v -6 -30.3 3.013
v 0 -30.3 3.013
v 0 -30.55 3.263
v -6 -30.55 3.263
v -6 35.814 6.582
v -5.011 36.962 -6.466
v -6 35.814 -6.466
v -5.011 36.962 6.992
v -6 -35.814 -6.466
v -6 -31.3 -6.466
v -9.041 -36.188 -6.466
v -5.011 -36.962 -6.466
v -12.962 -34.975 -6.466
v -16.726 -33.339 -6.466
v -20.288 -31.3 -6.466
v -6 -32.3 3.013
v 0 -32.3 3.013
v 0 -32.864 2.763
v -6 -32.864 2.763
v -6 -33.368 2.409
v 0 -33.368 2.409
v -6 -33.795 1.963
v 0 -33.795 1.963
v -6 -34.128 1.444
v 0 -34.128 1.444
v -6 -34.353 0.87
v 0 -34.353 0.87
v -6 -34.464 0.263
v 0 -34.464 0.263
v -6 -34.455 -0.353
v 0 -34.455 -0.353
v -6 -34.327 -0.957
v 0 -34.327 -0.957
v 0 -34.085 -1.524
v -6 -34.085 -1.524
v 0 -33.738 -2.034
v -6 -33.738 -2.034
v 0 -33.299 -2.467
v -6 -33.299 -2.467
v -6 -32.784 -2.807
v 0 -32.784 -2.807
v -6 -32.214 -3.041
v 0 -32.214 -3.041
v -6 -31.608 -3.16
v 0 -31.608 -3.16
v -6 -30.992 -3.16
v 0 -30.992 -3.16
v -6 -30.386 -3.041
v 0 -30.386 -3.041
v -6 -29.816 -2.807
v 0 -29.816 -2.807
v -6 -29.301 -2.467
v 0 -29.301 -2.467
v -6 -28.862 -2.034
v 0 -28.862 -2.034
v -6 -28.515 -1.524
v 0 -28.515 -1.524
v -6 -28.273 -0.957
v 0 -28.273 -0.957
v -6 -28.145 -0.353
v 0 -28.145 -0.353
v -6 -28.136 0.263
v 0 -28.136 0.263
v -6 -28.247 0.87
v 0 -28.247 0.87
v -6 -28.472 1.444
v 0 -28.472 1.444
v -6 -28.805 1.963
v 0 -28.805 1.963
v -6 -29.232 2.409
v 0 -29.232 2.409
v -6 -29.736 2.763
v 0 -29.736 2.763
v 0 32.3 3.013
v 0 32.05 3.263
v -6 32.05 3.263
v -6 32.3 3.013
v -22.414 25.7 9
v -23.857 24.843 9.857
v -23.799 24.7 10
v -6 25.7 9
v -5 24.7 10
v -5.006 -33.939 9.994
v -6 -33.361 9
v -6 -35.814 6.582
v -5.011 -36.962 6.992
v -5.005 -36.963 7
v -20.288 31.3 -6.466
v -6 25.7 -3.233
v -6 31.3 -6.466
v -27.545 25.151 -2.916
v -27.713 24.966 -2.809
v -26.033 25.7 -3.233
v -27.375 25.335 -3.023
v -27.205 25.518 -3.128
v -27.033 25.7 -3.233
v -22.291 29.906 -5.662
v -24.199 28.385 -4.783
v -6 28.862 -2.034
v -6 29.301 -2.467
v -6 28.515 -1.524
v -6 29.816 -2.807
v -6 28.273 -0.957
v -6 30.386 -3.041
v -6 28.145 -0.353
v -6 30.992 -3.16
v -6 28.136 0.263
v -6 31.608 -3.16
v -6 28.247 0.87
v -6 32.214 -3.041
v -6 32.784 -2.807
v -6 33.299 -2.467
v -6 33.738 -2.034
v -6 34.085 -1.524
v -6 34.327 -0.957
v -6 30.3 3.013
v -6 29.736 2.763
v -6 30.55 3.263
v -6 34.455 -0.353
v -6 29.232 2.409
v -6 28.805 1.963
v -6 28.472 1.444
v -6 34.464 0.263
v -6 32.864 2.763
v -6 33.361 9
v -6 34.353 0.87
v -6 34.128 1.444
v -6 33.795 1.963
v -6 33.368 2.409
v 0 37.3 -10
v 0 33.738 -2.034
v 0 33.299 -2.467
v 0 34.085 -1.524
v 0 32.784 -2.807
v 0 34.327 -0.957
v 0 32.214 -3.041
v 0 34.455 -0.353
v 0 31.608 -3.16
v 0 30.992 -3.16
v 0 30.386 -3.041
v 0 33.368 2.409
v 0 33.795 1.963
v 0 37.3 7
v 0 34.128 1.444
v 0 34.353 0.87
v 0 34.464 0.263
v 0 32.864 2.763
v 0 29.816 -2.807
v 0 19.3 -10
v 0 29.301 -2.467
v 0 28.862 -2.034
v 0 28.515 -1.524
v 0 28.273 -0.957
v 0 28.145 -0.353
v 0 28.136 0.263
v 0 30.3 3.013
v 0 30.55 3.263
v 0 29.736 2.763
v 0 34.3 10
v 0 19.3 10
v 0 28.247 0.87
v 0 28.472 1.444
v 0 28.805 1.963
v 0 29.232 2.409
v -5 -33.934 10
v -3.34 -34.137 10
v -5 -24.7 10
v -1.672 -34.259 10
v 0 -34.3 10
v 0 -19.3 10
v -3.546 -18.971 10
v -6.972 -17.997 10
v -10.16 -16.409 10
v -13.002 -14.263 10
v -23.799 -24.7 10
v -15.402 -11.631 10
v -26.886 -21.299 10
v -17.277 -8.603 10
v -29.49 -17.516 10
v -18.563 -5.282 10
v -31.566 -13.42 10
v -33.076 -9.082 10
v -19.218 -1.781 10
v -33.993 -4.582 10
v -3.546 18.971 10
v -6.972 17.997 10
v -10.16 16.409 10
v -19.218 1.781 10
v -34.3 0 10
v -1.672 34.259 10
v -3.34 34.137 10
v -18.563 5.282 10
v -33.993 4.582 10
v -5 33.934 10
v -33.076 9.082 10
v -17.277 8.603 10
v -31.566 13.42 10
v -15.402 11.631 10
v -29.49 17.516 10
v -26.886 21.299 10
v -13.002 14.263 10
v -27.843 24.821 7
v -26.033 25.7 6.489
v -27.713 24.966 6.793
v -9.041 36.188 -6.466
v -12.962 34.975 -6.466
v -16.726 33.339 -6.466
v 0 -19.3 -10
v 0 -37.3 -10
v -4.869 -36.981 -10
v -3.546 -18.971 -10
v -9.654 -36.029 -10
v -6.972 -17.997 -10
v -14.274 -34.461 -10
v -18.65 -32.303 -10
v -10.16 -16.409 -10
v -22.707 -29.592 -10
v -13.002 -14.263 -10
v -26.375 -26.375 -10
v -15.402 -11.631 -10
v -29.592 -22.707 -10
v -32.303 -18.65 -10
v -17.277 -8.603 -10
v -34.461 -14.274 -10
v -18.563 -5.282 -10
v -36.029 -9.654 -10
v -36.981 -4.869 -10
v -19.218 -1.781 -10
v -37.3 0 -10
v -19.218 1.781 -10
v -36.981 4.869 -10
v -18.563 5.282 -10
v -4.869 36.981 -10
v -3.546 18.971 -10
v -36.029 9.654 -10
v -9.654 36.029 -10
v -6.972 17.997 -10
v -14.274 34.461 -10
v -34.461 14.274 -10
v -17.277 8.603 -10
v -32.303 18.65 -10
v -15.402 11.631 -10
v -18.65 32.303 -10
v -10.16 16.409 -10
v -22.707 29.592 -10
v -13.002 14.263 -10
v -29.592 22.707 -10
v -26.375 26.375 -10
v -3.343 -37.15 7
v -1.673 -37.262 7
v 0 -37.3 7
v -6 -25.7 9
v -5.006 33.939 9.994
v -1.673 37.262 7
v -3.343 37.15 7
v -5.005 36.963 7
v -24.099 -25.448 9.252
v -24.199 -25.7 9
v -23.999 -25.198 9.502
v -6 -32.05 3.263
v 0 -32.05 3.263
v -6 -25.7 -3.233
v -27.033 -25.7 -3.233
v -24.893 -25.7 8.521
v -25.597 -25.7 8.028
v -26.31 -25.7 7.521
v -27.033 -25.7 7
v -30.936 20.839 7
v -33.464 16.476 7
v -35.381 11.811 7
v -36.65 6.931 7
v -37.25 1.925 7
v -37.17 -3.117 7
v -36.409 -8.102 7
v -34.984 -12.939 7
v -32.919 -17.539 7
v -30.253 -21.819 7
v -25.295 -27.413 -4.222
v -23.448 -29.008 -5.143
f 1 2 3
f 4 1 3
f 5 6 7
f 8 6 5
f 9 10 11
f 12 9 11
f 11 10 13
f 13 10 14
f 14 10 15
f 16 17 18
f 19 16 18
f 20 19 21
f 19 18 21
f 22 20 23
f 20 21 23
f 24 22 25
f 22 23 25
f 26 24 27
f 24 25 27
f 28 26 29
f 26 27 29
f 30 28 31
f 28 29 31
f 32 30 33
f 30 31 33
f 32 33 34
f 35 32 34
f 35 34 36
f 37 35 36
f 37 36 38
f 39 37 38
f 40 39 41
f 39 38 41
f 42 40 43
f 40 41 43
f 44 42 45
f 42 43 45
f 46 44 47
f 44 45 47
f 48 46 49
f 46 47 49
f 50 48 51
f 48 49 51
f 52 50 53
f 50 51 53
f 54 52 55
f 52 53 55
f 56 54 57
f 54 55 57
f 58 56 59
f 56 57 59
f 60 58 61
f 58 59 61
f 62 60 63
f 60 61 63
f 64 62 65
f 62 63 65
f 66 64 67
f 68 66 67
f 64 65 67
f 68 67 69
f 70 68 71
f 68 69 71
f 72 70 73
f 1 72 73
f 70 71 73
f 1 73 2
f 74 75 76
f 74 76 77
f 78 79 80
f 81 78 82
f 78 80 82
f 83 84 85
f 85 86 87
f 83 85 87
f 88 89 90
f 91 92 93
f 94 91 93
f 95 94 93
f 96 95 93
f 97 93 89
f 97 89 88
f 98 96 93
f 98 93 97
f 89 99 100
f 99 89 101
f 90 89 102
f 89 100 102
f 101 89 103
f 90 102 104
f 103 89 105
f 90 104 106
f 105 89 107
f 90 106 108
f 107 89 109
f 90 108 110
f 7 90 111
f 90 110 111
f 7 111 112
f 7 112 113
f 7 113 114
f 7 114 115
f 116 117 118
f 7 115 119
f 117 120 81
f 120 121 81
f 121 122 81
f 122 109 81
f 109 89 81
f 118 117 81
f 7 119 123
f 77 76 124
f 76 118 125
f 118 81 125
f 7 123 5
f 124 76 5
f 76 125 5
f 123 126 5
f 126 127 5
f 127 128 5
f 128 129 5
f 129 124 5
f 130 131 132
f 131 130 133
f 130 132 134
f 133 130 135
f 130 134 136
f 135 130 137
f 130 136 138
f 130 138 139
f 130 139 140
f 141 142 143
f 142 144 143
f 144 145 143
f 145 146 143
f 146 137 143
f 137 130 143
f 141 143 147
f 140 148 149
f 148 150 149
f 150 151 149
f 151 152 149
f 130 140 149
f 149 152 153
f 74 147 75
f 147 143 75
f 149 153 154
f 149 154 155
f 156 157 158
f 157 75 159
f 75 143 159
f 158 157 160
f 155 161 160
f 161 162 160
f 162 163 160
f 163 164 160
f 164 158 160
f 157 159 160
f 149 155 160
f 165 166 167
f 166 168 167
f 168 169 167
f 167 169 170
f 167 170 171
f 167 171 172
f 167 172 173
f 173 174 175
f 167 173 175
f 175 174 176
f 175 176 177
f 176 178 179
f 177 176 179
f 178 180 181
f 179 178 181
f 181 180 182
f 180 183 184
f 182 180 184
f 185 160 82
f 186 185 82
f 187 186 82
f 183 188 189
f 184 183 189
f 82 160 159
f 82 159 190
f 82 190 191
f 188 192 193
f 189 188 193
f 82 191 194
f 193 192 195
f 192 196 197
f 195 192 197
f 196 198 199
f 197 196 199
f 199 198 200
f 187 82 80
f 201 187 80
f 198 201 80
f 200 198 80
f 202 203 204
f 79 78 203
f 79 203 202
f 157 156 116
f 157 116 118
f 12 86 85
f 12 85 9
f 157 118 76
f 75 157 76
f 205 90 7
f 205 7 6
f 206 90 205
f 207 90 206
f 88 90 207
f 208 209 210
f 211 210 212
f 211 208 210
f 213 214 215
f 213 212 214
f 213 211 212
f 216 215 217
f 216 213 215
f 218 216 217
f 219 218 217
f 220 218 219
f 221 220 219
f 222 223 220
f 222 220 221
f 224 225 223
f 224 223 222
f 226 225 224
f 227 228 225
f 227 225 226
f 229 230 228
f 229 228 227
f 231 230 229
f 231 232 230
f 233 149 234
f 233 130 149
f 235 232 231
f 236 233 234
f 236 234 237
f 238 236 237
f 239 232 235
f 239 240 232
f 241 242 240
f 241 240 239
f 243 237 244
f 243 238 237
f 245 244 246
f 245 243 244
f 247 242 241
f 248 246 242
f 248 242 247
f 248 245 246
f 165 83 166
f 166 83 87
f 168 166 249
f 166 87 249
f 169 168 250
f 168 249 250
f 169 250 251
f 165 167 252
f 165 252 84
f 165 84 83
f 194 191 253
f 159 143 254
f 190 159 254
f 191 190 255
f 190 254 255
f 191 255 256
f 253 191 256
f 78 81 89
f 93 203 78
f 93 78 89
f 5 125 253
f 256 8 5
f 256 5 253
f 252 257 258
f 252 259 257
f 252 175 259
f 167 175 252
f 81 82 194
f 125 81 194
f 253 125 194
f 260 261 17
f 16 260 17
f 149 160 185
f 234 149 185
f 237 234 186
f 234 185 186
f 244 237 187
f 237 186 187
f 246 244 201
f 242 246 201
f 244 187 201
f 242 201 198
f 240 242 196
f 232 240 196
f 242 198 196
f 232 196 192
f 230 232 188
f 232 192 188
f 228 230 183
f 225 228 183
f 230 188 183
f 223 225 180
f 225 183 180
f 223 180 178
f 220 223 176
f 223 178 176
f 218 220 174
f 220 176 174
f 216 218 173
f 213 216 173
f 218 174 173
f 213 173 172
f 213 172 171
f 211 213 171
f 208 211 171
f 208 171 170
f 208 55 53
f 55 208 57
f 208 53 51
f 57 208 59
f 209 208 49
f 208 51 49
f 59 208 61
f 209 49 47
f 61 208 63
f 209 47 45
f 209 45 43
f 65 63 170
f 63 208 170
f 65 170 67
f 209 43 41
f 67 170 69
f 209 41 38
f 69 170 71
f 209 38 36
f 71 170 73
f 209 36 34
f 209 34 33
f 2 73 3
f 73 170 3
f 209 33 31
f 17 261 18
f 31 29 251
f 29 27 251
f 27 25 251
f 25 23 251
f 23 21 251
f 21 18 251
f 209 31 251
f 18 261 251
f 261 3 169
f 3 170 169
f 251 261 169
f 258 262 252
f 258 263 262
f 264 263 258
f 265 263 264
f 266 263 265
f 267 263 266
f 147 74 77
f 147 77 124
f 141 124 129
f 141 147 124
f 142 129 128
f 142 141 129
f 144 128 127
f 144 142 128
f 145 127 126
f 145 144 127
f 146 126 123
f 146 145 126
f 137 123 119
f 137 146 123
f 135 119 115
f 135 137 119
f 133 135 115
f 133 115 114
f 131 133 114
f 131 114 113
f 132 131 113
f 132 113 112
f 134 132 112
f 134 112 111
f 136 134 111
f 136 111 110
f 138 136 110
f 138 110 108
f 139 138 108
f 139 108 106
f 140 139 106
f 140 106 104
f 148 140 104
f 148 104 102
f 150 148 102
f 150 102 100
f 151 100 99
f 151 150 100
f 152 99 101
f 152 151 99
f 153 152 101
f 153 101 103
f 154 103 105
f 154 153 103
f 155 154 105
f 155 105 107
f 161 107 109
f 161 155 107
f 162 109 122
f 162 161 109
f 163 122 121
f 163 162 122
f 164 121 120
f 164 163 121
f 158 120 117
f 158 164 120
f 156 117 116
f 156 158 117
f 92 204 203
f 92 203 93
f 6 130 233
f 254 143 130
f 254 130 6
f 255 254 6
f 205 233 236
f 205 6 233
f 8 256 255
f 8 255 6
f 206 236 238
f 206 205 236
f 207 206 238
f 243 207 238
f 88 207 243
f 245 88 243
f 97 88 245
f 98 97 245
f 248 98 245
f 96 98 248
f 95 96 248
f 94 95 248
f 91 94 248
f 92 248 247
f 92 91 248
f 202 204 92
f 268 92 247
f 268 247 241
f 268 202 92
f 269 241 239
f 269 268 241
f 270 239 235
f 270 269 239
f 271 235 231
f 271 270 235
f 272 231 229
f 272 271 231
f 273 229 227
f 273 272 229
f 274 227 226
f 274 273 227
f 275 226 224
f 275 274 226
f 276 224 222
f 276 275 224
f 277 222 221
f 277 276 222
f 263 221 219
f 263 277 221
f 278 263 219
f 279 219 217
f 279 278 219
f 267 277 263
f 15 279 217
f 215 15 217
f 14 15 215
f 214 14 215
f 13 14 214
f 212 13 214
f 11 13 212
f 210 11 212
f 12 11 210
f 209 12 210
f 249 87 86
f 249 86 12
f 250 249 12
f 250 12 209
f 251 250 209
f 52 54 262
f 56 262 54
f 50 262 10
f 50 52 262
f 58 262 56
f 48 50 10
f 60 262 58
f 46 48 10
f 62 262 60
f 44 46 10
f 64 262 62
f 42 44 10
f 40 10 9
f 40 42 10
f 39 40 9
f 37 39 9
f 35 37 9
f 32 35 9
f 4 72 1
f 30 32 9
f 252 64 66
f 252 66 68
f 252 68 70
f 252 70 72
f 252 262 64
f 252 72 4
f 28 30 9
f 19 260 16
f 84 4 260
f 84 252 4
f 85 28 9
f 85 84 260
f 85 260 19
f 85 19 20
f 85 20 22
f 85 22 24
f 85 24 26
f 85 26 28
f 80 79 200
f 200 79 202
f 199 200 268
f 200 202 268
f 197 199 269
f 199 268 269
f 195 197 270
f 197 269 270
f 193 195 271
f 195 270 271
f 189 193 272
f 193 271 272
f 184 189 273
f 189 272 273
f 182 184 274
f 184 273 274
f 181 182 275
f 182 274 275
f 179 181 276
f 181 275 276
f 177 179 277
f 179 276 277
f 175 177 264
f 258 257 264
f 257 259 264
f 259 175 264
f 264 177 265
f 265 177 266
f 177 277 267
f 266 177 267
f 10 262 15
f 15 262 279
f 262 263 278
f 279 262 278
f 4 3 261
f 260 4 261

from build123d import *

# Parameters (mm, degrees)
PAD007_DEPTH    = 10
SKETCH023_R     = 3.175
POCKET013_DEPTH = 208.8404998244
POCKET014_DEPTH = 208.8405005395
POCKET015_DEPTH = 32
CHAMFER005_SIZE = 3
SKETCH026_W     = 11.6
SKETCH026_H     = 13.2331615075
POCKET016_DEPTH = 32
SKETCH027_W     = 6
SKETCH027_H     = 3.1836615393
POCKET017_DEPTH = 32
CHAMFER006_SIZE = 1


with BuildPart() as part:
    # Sketch022 → Pad007 (new body, symmetric)
    with BuildSketch(Plane.XY):
        with BuildLine():
            ThreePointArc((0, 19.3), (-19.3, 0), (0, -19.3))
            Line((0, -19.3), (0, -37.3))
            ThreePointArc((0, 37.3), (-37.3, 0), (0, -37.3))
            Line((0, 37.3), (0, 19.3))
        make_face()
    extrude(amount=PAD007_DEPTH, both=True)

    # Sketch023 (on Face3 of Pad007) → Pocket013 (cut, through all)
    with BuildSketch(Plane.YZ):
        with Locations((-31.3, 0)):
            Circle(SKETCH023_R)
    pocket013 = extrude(amount=-POCKET013_DEPTH, mode=Mode.SUBTRACT)

    # Mirrored013: Pocket013 across Sketch023 V_Axis
    add(pocket013.mirror(Plane(origin=(0, 0, 0), x_dir=(1, 0, 0), z_dir=(0, 1, 0))), mode=Mode.SUBTRACT)

    # Sketch024 (on Face7 of Mirrored013) → Pocket014 (cut, through all)
    with BuildSketch(Plane.YZ):
        Polygon((-32.3, 3.0134075396), (-30.3, 3.0134075396), (-30.55, 3.2634075396), (-32.05, 3.2634075396), align=None)
    pocket014 = extrude(amount=-POCKET014_DEPTH, mode=Mode.SUBTRACT)

    # Mirrored014: Pocket014 across Sketch024 V_Axis
    add(pocket014.mirror(Plane(origin=(0, 0, 0), x_dir=(1, 0, 0), z_dir=(0, 1, 0))), mode=Mode.SUBTRACT)

    # Sketch025 (on DatumPlane) → Pocket015 (cut)
    with BuildSketch(Plane(origin=(-38, 0, 0), x_dir=(0, -1, 0), z_dir=(-1, 0, 0))):
        Polygon((31.3, 6.4663230149), (25.7, 3.2331615075), (25.7, -3.2331615075), (31.3, -6.4663230149), (36.9, -3.2331615075), (36.9, 3.2331615075), align=None)
    pocket015 = extrude(amount=-POCKET015_DEPTH, mode=Mode.SUBTRACT)

    # Mirrored015: Pocket015 across Sketch025 V_Axis
    add(pocket015.mirror(Plane(origin=(-38, 0, 0), x_dir=(-1, 0, 0), z_dir=(0, -1, 0))), mode=Mode.SUBTRACT)

    # Chamfer005
    chamfer005_edges = [part.edges().sort_by_distance(p)[0] for p in [
        (-37.3, 0, 10),
    ]]
    chamfer(chamfer005_edges, length=CHAMFER005_SIZE)

    # Sketch026 (on DatumPlane) → Pocket016 (cut)
    with BuildSketch(Plane(origin=(-38, 0, 0), x_dir=(0, -1, 0), z_dir=(-1, 0, 0))):
        with Locations((31.5, 3.3834192463)):
            Rectangle(SKETCH026_W, SKETCH026_H)
    pocket016 = extrude(amount=-POCKET016_DEPTH, mode=Mode.SUBTRACT)

    # Mirrored016: Pocket016 across Sketch026 V_Axis
    add(pocket016.mirror(Plane(origin=(-38, 0, 0), x_dir=(-1, 0, 0), z_dir=(0, -1, 0))), mode=Mode.SUBTRACT)

    # Sketch027 (on DatumPlane) → Pocket017 (cut)
    with BuildSketch(Plane(origin=(-38, 0, 0), x_dir=(0, -1, 0), z_dir=(-1, 0, 0))):
        with Locations((34.3, -4.8744922453)):
            Rectangle(SKETCH027_W, SKETCH027_H)
    pocket017 = extrude(amount=-POCKET017_DEPTH, mode=Mode.SUBTRACT)

    # Mirrored017: Pocket017 across Sketch027 V_Axis
    add(pocket017.mirror(Plane(origin=(-38, 0, 0), x_dir=(-1, 0, 0), z_dir=(0, -1, 0))), mode=Mode.SUBTRACT)

    # Chamfer006
    chamfer006_edges = [part.edges().sort_by_distance(p)[0] for p in [
        (-14.357817, -25.7, 10),
        (-6, -29.735571, 10),
        (-6, -35.293157, 8.500461),
        (-6, -36.814264, 0.266838),
        (-27.033313, 25.7, 1.883419),
        (-24.890244, 25.7, 8.522713),
        (-14.357817, 25.7, 10),
        (-6, 29.735571, 10),
        (-6, 35.293157, 8.500461),
        (-6, 36.814264, 0.266838),
    ]]
    chamfer(chamfer006_edges, length=CHAMFER006_SIZE)


solid = part.part
